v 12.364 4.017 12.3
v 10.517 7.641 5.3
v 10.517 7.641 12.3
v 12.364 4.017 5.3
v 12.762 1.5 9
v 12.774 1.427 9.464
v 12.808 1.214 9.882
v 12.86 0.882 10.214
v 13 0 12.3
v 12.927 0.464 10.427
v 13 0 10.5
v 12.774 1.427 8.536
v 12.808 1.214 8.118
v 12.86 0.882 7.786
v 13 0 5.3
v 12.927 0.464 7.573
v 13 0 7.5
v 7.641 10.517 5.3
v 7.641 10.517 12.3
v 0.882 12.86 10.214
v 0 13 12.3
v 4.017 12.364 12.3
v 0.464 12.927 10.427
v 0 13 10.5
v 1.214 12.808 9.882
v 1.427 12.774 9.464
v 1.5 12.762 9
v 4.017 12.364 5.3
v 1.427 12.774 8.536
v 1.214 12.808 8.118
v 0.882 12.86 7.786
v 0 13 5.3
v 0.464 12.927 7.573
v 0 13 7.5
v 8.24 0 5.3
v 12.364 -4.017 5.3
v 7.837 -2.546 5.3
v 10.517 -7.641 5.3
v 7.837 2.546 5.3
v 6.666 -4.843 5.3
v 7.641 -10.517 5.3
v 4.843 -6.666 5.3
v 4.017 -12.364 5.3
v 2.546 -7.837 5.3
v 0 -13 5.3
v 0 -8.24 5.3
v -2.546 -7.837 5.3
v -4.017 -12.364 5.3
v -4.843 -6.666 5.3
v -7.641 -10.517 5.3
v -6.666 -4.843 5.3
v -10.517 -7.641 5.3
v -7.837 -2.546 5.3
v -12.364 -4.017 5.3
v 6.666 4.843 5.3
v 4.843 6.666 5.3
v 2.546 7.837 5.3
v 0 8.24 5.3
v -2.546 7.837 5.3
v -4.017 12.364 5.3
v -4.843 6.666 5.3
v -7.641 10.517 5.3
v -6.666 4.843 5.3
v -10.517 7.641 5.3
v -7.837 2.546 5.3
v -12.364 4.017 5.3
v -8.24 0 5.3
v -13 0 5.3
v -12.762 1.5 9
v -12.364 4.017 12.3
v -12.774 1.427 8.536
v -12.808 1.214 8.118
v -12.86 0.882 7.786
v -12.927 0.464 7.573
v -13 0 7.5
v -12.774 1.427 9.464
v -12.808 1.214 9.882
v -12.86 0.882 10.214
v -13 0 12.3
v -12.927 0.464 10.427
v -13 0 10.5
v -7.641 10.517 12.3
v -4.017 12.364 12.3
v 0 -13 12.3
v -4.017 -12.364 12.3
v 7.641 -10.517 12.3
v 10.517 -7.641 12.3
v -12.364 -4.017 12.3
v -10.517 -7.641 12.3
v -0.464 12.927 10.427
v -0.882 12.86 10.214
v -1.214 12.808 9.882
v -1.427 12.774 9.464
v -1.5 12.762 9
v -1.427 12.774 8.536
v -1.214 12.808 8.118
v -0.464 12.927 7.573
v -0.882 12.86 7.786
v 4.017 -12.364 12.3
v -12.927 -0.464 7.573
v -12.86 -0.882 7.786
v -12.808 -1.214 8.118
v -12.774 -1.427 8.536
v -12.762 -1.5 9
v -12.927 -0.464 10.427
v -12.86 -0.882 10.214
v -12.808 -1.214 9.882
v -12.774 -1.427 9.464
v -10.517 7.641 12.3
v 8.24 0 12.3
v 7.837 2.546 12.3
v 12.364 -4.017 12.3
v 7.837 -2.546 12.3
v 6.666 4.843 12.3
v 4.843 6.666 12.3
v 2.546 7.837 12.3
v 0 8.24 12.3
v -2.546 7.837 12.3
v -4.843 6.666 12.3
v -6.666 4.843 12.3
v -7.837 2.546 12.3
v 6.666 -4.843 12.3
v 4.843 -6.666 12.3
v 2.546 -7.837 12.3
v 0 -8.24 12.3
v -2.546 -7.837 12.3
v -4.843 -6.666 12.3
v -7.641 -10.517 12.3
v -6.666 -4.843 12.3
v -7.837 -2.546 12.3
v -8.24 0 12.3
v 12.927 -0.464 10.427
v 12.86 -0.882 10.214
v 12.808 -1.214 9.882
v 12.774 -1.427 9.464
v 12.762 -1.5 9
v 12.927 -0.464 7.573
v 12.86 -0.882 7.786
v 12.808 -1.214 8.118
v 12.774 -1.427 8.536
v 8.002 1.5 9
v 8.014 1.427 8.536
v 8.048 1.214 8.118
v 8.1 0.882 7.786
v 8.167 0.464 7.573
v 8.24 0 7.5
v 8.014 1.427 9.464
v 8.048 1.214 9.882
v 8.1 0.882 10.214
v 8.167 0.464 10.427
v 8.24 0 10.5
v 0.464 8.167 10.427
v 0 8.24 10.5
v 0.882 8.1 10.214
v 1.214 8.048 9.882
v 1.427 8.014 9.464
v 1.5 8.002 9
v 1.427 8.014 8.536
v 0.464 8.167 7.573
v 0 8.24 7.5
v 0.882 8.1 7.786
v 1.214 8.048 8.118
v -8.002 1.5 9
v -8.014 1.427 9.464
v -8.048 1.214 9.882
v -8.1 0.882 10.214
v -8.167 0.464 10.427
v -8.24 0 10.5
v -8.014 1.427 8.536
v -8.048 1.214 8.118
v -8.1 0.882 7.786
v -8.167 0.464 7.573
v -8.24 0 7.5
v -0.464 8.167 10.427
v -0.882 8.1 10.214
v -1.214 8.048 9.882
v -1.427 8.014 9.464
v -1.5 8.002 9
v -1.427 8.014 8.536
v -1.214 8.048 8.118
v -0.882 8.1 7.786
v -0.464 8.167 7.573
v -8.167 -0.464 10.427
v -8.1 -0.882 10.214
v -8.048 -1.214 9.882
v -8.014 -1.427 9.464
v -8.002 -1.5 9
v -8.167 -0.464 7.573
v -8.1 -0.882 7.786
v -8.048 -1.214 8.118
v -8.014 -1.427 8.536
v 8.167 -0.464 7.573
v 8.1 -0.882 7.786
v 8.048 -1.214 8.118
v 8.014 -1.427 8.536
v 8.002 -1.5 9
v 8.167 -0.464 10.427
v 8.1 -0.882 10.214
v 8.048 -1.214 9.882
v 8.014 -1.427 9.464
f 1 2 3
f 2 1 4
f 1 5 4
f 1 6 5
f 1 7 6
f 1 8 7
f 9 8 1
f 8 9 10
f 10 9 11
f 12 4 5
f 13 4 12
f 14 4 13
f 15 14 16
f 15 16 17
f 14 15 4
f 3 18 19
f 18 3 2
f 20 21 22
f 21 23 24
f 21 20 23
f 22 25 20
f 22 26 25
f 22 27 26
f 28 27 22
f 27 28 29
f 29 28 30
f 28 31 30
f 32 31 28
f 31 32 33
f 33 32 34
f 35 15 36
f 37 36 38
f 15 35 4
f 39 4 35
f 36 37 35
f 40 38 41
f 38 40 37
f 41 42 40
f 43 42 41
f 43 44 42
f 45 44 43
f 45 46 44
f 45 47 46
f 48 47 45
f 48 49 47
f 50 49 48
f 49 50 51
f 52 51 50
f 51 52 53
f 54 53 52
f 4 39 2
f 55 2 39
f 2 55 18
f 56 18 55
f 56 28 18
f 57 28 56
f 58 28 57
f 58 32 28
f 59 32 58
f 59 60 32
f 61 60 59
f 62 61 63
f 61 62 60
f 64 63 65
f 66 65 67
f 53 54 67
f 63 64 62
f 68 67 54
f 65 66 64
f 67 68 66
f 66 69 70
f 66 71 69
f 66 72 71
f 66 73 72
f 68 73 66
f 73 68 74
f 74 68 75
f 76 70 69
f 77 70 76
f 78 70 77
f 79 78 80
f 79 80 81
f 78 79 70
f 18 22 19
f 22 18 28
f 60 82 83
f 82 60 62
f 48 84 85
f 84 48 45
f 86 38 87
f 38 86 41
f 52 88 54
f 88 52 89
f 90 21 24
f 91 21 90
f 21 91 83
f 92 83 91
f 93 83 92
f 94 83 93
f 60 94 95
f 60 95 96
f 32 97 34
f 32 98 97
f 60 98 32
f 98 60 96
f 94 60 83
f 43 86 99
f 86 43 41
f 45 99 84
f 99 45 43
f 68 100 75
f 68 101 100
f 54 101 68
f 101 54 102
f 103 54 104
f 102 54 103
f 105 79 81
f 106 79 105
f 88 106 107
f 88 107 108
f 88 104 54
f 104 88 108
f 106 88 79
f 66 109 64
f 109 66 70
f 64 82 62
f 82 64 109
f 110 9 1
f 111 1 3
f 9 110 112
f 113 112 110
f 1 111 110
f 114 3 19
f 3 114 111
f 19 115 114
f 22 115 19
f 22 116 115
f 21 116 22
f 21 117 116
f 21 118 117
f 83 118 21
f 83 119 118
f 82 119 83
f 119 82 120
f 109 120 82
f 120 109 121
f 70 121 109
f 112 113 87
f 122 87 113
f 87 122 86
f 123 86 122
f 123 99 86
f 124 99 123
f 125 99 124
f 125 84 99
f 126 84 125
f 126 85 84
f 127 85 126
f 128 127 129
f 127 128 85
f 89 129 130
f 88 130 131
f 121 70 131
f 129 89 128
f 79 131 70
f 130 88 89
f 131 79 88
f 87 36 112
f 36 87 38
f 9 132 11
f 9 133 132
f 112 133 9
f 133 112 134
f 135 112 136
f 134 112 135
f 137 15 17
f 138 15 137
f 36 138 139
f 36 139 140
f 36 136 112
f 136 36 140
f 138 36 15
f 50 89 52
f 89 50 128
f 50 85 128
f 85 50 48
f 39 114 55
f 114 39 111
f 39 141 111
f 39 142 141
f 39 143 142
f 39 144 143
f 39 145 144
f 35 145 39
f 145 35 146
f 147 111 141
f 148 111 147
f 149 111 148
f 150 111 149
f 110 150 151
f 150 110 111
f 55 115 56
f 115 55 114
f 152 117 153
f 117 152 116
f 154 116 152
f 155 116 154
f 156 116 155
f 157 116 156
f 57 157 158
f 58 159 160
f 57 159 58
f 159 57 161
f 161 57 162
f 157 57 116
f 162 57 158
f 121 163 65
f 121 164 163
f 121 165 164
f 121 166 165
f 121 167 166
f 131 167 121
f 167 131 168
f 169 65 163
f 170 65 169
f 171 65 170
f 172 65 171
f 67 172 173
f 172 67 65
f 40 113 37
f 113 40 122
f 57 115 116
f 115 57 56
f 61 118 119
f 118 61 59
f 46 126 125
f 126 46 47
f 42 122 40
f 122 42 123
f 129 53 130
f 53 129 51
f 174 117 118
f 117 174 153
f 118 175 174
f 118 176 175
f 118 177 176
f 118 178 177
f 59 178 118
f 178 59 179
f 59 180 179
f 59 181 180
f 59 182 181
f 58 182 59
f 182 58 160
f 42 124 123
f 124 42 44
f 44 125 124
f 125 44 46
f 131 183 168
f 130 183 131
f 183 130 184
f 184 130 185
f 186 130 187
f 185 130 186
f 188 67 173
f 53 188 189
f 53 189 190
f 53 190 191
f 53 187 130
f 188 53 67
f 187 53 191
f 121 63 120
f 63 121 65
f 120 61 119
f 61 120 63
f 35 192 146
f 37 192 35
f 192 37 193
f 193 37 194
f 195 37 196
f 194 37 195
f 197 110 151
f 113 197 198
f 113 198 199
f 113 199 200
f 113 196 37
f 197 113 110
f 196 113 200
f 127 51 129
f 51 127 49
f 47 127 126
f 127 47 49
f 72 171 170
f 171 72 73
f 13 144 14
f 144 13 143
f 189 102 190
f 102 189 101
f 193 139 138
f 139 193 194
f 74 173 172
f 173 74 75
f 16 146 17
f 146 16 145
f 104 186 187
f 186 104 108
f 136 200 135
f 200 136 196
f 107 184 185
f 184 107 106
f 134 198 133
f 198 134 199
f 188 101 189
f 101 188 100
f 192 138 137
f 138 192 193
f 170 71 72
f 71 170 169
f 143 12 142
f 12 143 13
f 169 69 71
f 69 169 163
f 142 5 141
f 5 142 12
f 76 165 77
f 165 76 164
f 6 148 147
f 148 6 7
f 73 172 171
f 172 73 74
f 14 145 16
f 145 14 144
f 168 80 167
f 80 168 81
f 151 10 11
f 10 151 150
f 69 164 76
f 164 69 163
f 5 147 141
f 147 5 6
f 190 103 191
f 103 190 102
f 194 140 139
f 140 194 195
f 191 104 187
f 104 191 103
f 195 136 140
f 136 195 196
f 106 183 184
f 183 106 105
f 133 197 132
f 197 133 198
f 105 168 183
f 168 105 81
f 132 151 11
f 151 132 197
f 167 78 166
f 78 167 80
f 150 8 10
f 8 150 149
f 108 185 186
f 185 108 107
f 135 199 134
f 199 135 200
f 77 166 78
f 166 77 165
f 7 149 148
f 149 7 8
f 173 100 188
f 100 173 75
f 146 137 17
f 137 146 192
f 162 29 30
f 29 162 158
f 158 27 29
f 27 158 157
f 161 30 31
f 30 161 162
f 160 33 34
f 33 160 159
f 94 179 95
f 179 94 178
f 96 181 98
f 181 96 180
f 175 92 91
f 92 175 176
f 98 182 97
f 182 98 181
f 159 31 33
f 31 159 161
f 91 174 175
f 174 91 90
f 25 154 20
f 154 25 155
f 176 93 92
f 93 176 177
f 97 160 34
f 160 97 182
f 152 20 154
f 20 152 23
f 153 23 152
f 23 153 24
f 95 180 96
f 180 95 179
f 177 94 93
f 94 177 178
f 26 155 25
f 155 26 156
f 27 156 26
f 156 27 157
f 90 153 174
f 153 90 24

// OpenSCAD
//import("BOM_inventory/build5/valvepart_pp.stl");

translate([0,0,8])valve_pp_top();

module valve_pp_top(){
difference(){
union(){
translate([0,0,-2-1.4-1.5+1.2-2+2+1])cylinder(r=13,h=7,$fn=20);
}
translate([0,0,-2-1.4-1.5+1.2-2+2+1])cylinder(r=8.24,h=15,$fn=20);
translate([-30,0,1])rotate([0,90,0])#cylinder(r=3/2,h=59,$fn=20);
translate([0,0,1])rotate([-90,0,0])#cylinder(r=3/2,h=59,$fn=20);
}
}
